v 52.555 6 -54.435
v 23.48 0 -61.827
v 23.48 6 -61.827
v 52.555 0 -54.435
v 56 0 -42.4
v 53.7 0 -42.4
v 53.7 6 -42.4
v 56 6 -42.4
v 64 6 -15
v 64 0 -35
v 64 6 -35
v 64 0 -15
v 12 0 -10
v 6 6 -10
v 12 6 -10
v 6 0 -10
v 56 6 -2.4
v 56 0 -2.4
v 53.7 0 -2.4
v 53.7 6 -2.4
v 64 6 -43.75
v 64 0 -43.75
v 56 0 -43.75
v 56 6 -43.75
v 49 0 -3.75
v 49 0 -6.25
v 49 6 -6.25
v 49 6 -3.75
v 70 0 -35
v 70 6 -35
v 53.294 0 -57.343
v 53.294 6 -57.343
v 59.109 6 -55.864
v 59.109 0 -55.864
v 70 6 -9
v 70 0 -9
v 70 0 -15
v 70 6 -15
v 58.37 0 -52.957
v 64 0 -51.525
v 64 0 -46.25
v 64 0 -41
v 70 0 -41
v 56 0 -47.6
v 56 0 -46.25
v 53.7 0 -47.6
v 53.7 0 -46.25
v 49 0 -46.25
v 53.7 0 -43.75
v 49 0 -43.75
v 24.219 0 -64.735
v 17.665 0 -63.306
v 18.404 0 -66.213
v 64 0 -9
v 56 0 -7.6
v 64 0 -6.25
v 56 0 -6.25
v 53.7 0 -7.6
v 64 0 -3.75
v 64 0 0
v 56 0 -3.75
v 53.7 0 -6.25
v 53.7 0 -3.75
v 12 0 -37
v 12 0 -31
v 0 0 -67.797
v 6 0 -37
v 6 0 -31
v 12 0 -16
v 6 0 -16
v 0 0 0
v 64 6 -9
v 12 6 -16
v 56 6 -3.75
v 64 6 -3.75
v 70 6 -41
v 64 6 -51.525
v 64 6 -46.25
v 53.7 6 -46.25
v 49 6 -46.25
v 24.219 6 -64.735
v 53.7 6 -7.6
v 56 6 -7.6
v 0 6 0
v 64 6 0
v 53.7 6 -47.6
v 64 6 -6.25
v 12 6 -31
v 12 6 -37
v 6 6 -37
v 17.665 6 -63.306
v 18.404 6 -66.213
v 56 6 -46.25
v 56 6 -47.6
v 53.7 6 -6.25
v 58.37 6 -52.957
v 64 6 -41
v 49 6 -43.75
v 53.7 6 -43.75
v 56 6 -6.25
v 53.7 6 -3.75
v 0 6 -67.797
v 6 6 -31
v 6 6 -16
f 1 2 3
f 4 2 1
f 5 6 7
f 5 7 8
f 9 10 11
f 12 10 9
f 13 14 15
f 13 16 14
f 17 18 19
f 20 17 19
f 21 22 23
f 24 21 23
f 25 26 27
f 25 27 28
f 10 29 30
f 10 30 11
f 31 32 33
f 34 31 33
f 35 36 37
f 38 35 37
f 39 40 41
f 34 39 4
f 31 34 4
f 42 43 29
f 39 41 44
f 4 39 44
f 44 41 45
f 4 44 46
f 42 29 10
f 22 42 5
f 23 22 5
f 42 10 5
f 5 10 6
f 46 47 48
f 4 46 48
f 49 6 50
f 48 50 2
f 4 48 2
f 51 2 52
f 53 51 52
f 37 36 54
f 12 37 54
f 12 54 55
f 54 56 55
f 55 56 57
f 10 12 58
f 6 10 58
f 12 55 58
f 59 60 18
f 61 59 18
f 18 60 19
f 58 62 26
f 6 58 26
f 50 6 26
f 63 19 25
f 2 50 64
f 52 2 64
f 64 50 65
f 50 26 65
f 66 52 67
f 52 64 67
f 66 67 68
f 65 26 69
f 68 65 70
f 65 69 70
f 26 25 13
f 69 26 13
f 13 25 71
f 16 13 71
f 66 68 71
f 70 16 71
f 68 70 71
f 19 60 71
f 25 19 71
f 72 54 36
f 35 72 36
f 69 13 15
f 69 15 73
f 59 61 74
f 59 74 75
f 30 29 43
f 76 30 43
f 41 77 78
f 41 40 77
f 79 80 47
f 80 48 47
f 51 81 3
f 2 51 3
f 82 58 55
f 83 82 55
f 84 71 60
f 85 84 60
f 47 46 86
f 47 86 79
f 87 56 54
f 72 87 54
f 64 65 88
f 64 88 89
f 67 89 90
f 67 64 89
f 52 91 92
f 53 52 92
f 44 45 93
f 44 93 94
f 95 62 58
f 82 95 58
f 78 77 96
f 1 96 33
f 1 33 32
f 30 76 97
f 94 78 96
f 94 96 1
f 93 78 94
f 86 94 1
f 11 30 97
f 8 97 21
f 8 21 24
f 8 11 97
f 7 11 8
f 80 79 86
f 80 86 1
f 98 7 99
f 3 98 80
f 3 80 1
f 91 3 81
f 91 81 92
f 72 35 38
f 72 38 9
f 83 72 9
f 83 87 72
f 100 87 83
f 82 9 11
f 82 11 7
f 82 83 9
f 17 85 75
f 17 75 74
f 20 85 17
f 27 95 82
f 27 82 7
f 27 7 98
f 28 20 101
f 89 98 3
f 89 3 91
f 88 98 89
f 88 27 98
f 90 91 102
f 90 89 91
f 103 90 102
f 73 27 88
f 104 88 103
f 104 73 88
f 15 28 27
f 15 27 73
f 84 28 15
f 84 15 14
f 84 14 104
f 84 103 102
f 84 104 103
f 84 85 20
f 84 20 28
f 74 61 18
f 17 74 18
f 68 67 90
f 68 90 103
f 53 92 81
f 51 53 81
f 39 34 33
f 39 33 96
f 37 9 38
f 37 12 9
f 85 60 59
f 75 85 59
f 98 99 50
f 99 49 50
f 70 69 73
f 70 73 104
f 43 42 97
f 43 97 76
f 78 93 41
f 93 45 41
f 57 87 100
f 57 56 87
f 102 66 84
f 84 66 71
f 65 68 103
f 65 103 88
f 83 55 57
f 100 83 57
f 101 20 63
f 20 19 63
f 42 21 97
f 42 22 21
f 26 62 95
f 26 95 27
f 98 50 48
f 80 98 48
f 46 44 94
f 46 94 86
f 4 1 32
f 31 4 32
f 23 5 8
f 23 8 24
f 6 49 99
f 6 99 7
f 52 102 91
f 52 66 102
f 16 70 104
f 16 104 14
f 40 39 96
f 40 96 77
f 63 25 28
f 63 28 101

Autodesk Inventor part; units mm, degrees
ref_plane "YZ Plane" through (0, 0, 0) normal (1, 0, 0) x (0, 1, 0)
ref_plane "XZ Plane" through (0, 0, 0) normal (0, 1, 0) x (-1, 0, 0)
ref_plane "XY Plane" through (0, 0, 0) normal (0, 0, 1) x (1, 0, 0)
sketch "Sketch1" plane through (0, 0, 0) normal (0, 1, 0) x (-1, 0, 0)
  line L0 (0, 0) -> (-70, 0)
  line L1 (-70, 0) -> (-70, -50)
  line L2 (-70, -50) -> (0, -50)
  line L3 (0, -50) -> (0, 0)
  line L4 (0, -50) -> (0, -67.7966)
  line L5 (0, -67.7966) -> (-70, -50)
  dimension "d0" = 70
  dimension "d1" = 50
  dimension "d45" = 14.264
extrude "Extrusion1" add sketch "Sketch1" along normal blind 6
sketch "Sketch2" plane through (0, 6, 0) normal (0, 1, 0) x (1, 0, 0)
  line L0 (70, 50) -> (58.37, 52.9568) construction
  line L1 (70, 50) -> (0, 67.7966) construction
  line L2 (58.37, 52.9568) -> (52.555, 54.4352)
  line L3 (52.555, 54.4352) -> (53.2942, 57.3427)
  line L4 (53.2942, 57.3427) -> (59.1092, 55.8643)
  line L5 (59.1092, 55.8643) -> (58.37, 52.9568)
  line L6 (23.4799, 61.8271) -> (17.6649, 63.3055)
  line L7 (17.6649, 63.3055) -> (18.4041, 66.213)
  line L8 (18.4041, 66.213) -> (24.2191, 64.7346)
  line L9 (24.2191, 64.7346) -> (23.4799, 61.8271)
  point P0 (0, 0)
  dimension "d9" = 12
  dimension "d10" = 6
  dimension "d11" = 3
  dimension "d15" = 6
  dimension "d16" = 3
  dimension "d17" = 30
extrude "Extrusion2" add sketch "Sketch2" against normal blind 6
sketch "Sketch3" plane through (0, 6, 0) normal (0, 1, 0) x (1, 0, 0)
  line L0 (70, 0) -> (70, 50) projected
  line L1 (70, 54) -> (64, 54)
  line L2 (64, 54) -> (64, 41)
  line L3 (64, 41) -> (70, 41)
  line L4 (70, 41) -> (70, 54)
  line L5 (70, 0) -> (64, 0)
  line L6 (64, 0) -> (64, 9)
  line L7 (64, 9) -> (70, 9)
  line L8 (70, 9) -> (70, 0)
  line L9 (70, 35) -> (64, 35)
  line L10 (64, 35) -> (64, 15)
  line L11 (64, 15) -> (70, 15)
  line L12 (70, 15) -> (70, 35)
  point P0 (0, 0)
  dimension "d18" = 6
  dimension "d20" = 6
  dimension "d21" = 9
  dimension "d22" = 6
  dimension "d23" = 6
  dimension "d27" = 20
  dimension "d36" = 13
extrude "Extrusion3" cut sketch "Sketch3" along normal through all both and the other way through all
sketch "Sketch4" plane through (0, 6, 0) normal (0, 1, 0) x (1, 0, 0)
  line L0 (64, 0) -> (64, 9) projected
  line L1 (64, 6.25) -> (56, 6.25)
  line L2 (49, 6.25) -> (49, 3.75)
  line L3 (49, 3.75) -> (53.7, 3.75)
  line L4 (64, 3.75) -> (64, 6.25)
  line L5 (64, 9) -> (70, 9) projected
  line L6 (64, 43.75) -> (56, 43.75)
  line L7 (49, 43.75) -> (49, 46.25)
  line L8 (49, 46.25) -> (53.7, 46.25)
  line L9 (64, 46.25) -> (64, 43.75)
  line L10 (70, 41) -> (64, 41) projected
  line L11 (64, 41) -> (64, 51.5254) projected
  line L12 (56, 47.6) -> (53.7, 47.6)
  line L13 (53.7, 47.6) -> (53.7, 46.25)
  line L14 (53.7, 42.4) -> (56, 42.4)
  line L15 (56, 42.4) -> (56, 43.75)
  line L16 (53.7, 7.6) -> (56, 7.6)
  line L17 (56, 7.6) -> (56, 6.25)
  line L18 (56, 2.4) -> (53.7, 2.4)
  line L19 (53.7, 2.4) -> (53.7, 3.75)
  line L20 (53.7, 6.25) -> (53.7, 7.6)
  line L21 (53.7, 3.75) -> (53.7, 6.25) construction
  line L22 (56, 6.25) -> (56, 3.75) construction
  line L23 (56, 3.75) -> (56, 2.4)
  line L24 (56, 3.75) -> (64, 3.75)
  line L25 (53.7, 3.75) -> (56, 3.75) construction
  line L26 (56, 6.25) -> (53.7, 6.25) construction
  line L27 (53.7, 6.25) -> (49, 6.25)
  line L28 (53.7, 43.75) -> (53.7, 42.4)
  line L29 (53.7, 46.25) -> (53.7, 43.75) construction
  line L30 (53.7, 43.75) -> (49, 43.75)
  line L31 (56, 43.75) -> (53.7, 43.75) construction
  line L32 (56, 46.25) -> (56, 47.6)
  line L33 (56, 43.75) -> (56, 46.25) construction
  line L34 (53.7, 46.25) -> (56, 46.25) construction
  line L35 (56, 46.25) -> (64, 46.25)
  line L36 (6, 10) -> (12, 10)
  line L37 (12, 10) -> (12, 16)
  line L38 (12, 16) -> (6, 16)
  line L39 (6, 16) -> (6, 10)
  line L40 (6, 31) -> (12, 31)
  line L41 (12, 31) -> (12, 37)
  line L42 (12, 37) -> (6, 37)
  line L43 (6, 37) -> (6, 31)
  line L44 (0, 0) -> (64, 0) projected
  line L45 (0, 67.7966) -> (0, 0) projected
  point P0 (64, 45)
  dimension "d37" = 15
  dimension "d38" = 2.5
  dimension "d42" = 15
  dimension "d43" = 2.5
  dimension "d44" = 2.75
  dimension "d46" = 2.75
  dimension "d47" = 5.2
  dimension "d48" = 2.3
  dimension "d49" = 5.2
  dimension "d50" = 8
  dimension "d51" = 8
  dimension "d52" = 6
  dimension "d53" = 6
  dimension "d54" = 6
  dimension "d55" = 6
  dimension "d56" = 10
  dimension "d57" = 6
  dimension "d58" = 15
extrude "Extrusion4" cut sketch "Sketch4" along normal through all both and the other way through all
equation "\"d15\" = d10"
equation "\"d16\" = d11"
equation "\"d18\" = d20"
equation "\"d42\" = d37"
equation "\"d43\" = d38"
equation "\"d44\" = d46"
equation "\"d50\" = d51"
equation "\"d54\" = d52"
properties part number "pinball-case-left-wal-scaledl"
